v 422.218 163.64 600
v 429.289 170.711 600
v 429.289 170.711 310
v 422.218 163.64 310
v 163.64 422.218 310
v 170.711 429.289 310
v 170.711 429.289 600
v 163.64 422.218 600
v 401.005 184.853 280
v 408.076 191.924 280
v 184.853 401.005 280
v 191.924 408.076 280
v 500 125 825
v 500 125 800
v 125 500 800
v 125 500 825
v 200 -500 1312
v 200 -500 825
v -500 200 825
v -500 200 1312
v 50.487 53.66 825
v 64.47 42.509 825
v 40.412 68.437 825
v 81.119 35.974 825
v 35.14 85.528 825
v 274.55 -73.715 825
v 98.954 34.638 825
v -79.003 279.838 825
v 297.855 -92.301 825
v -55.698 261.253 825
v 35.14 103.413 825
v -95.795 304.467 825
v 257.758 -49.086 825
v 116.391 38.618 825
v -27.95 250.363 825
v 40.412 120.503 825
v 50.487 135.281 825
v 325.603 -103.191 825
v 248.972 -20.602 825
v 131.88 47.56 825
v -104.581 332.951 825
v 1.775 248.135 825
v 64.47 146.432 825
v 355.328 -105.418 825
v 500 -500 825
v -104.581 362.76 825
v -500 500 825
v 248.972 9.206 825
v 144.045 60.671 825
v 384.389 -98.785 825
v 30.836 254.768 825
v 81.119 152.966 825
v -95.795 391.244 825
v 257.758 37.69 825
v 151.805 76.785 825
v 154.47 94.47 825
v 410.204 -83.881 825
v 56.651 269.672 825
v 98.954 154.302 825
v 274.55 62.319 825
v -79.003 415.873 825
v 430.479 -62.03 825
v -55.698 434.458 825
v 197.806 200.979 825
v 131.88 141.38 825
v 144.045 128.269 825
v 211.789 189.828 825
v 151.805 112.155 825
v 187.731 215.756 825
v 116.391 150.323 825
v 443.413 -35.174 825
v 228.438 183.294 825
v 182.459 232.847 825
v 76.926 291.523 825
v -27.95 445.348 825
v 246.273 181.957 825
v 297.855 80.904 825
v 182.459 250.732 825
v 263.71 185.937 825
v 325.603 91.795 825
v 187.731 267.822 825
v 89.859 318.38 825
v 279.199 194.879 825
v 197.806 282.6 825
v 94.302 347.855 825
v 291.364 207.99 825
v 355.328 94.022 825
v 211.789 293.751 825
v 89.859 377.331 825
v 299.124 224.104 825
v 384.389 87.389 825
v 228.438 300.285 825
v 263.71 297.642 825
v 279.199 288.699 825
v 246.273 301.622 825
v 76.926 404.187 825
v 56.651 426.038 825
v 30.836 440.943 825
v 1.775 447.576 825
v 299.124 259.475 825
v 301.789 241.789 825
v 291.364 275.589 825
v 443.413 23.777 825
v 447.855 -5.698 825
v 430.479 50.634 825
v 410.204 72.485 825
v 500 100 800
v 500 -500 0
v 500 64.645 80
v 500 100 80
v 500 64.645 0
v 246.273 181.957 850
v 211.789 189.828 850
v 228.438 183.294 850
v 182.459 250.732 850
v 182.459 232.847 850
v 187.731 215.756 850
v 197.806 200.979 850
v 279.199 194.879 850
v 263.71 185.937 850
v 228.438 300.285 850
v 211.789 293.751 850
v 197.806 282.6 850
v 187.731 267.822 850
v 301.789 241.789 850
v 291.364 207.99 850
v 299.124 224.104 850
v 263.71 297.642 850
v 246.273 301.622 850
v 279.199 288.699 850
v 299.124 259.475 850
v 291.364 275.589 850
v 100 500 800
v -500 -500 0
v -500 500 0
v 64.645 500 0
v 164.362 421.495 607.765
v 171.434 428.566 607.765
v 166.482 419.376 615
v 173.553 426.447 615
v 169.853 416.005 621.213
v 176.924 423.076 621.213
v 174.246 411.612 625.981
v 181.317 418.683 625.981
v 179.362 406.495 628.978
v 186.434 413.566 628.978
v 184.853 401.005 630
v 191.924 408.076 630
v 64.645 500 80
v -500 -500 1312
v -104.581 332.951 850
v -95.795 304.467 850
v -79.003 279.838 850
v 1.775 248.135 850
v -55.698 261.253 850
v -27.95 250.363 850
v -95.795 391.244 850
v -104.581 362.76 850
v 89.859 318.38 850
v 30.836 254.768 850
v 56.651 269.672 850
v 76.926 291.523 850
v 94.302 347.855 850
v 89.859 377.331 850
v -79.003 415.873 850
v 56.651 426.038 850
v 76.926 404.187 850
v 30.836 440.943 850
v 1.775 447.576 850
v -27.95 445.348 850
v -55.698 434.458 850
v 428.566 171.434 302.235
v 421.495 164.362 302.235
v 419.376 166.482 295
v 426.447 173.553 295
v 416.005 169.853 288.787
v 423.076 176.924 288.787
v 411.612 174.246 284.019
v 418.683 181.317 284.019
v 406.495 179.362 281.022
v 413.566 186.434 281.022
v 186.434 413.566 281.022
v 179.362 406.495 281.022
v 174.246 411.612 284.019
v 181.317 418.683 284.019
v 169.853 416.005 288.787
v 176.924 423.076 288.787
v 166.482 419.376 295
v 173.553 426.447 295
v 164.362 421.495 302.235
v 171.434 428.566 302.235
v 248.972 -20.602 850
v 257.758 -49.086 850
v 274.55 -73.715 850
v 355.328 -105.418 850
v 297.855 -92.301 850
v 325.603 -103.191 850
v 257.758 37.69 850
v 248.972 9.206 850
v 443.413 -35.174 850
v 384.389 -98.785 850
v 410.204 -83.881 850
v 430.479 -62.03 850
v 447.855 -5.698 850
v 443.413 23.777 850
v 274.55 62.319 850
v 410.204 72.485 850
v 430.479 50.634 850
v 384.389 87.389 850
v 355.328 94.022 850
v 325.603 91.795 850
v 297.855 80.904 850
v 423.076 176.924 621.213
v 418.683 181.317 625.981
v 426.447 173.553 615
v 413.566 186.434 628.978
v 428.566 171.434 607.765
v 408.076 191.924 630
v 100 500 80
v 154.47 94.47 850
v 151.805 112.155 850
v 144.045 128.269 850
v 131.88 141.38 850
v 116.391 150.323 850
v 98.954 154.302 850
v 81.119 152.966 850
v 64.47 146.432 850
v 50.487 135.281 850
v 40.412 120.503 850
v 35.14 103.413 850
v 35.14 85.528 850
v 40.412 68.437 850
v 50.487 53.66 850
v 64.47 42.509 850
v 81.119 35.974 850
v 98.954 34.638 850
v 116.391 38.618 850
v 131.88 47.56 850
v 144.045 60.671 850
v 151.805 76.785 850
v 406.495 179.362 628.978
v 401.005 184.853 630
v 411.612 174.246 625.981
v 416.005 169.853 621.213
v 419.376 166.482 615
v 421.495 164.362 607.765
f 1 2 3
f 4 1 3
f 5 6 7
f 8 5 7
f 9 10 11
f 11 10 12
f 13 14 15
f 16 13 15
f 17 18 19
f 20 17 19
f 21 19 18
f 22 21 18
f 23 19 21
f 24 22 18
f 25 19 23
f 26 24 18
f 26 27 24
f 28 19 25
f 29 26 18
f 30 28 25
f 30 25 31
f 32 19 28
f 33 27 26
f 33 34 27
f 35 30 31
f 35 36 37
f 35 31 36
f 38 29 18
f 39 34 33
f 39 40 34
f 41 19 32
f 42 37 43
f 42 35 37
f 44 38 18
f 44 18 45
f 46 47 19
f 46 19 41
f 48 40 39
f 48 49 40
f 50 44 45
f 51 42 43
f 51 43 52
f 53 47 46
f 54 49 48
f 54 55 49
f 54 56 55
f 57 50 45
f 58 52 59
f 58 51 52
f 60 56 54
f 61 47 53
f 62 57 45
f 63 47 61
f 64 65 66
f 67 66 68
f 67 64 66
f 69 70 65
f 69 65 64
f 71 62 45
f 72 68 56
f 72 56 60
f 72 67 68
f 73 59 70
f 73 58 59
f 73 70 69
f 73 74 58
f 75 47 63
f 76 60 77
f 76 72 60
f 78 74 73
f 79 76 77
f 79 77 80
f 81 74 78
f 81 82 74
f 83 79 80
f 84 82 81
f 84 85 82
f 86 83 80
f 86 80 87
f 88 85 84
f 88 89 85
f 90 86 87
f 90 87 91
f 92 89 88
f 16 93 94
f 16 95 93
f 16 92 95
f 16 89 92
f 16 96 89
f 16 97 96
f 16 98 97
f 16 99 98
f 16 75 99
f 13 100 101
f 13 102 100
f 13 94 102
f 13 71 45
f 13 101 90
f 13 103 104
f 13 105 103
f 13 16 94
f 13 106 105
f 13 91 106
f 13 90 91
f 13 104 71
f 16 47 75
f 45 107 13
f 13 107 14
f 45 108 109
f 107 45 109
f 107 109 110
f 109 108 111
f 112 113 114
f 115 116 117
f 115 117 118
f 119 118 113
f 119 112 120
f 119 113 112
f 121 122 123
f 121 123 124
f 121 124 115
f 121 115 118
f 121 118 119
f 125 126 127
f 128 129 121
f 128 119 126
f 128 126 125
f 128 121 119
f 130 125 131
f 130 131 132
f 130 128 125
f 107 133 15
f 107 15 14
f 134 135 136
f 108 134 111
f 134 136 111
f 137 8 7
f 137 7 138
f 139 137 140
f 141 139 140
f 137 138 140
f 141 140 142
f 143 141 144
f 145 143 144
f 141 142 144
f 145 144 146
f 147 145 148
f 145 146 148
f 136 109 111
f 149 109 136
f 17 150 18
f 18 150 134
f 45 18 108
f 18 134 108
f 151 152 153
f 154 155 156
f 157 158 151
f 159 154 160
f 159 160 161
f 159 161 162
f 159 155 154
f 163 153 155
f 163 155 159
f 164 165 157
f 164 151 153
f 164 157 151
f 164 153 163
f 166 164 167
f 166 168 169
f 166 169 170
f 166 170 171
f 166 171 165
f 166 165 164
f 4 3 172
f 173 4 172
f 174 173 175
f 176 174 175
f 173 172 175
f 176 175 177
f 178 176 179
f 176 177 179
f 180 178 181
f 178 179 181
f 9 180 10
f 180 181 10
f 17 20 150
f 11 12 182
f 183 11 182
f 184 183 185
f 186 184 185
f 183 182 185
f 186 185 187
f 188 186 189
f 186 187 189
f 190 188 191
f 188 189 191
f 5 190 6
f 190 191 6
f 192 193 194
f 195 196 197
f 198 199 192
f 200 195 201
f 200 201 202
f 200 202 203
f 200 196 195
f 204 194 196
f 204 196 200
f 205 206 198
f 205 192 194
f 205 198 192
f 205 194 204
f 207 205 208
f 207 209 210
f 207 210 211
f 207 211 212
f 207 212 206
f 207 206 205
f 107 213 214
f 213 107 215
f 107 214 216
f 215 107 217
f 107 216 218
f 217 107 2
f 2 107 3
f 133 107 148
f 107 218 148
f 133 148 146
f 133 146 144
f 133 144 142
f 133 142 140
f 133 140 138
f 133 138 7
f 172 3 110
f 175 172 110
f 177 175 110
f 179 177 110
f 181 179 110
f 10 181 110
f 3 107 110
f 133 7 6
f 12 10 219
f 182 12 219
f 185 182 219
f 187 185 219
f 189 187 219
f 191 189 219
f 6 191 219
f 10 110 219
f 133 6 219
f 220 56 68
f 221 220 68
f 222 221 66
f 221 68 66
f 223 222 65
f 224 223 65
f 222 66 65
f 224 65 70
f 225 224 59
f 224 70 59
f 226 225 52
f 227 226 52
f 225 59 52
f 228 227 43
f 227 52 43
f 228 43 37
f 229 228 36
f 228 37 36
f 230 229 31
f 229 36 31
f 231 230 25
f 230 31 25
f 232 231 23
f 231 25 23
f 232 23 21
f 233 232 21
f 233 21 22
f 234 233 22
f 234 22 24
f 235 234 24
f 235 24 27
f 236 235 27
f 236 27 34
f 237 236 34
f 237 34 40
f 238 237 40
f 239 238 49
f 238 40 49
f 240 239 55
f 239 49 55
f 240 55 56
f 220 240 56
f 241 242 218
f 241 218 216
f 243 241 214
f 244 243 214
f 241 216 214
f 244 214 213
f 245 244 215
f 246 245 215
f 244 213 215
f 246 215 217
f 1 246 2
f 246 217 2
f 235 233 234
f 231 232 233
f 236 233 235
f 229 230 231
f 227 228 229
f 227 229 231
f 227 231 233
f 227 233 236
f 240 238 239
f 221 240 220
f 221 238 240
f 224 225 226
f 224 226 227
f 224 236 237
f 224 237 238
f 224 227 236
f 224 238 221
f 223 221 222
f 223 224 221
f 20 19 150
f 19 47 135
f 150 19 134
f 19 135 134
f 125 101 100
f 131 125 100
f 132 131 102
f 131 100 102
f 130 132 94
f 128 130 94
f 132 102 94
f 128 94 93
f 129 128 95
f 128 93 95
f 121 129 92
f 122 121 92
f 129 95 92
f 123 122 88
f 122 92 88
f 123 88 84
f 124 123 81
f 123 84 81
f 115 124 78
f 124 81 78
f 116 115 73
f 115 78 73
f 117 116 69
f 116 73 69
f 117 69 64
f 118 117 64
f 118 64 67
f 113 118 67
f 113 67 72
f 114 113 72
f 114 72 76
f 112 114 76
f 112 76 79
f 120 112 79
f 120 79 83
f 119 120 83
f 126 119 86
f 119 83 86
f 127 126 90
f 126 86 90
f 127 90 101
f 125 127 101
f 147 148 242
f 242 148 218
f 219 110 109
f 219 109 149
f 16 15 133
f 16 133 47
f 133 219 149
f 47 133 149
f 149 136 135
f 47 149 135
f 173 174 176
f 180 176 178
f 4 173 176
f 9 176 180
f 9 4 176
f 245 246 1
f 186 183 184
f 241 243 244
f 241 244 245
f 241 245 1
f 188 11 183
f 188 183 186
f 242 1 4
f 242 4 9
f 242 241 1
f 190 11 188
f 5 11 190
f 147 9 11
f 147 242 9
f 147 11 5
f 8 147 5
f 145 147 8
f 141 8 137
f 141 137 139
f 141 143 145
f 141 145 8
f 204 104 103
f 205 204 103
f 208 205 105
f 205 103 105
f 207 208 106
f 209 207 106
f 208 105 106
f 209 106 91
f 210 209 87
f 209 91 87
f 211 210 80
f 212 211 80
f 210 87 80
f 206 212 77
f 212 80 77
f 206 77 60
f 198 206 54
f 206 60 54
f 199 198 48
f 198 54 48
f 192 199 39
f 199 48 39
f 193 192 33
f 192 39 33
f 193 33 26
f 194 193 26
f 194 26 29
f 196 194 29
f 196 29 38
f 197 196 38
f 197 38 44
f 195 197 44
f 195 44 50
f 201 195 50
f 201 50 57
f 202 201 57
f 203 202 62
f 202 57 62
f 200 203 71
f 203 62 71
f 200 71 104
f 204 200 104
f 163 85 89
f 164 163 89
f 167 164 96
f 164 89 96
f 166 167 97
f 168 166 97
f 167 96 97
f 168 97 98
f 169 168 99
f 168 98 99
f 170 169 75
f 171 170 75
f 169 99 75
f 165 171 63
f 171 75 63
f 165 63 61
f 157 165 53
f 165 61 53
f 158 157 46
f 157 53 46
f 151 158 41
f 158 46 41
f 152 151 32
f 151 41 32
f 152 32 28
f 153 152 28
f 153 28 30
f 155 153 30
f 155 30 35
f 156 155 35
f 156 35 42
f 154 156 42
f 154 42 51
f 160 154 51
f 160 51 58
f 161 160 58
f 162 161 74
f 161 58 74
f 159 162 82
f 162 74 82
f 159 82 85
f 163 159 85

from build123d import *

# Parameters (mm, degrees)
F1_DEPTH  = 800
F3_DEPTH  = 25
F4_W      = 1255.690882
F4_H      = 80
F5_DEPTH  = 25
F6_R      = 60
F6_R_2    = 100
F7_DEPTH  = 25
F9_DEPTH  = 10
F11_DEPTH = 487


with BuildPart() as f1:
    # F0 (on Top) → F1 (new body)
    with BuildSketch(Plane.XY):
        Polygon((-500, 500), (-500, -500), (500, -500), (500, 100), (100, 500), align=None)
    extrude(amount=F1_DEPTH)

    # F2 (on face) → F3 (join)
    with BuildSketch(Plane.XY.offset(800)):
        Polygon((-500, 500), (-500, -500), (500, -500), (500, 125), (125, 500), align=None)
    extrude(amount=F3_DEPTH)

    # F4 (on face) → F5 (cut)
    with BuildSketch(Plane(origin=(300, 300, 0), x_dir=(-0.707107, 0.707107, 0), z_dir=(0.707107, 0.707107, 0))):
        with Locations((133.201046, 40)):
            Rectangle(F4_W, F4_H)
    extrude(amount=-F5_DEPTH, mode=Mode.SUBTRACT)

    # F6 (on face) → F7 (join)
    with BuildSketch(Plane.XY.offset(825)):
        with Locations((241.789322, 241.789322)):
            Circle(F6_R)
        with Locations((94.470174, 94.470174)):
            Circle(F6_R)
        with Locations((347.855339, -5.698052)):
            Circle(F6_R_2)
        with Locations((-5.698052, 347.855339)):
            Circle(F6_R_2)
    extrude(amount=F7_DEPTH)

    # F8 (on face) → F9 (cut)
    with BuildSketch(Plane(origin=(300, 300, 0), x_dir=(-0.707107, 0.707107, 0), z_dir=(0.707107, 0.707107, 0))):
        with BuildLine():
            ThreePointArc((-182.842712, 310), (-174.055916, 288.786797), (-152.842712, 280))
            Line((-152.842712, 280), (152.842712, 280))
            ThreePointArc((152.842712, 280), (174.055916, 288.786797), (182.842712, 310))
            Line((182.842712, 310), (182.842712, 600))
            ThreePointArc((182.842712, 600), (174.055916, 621.213203), (152.842712, 630))
            Line((152.842712, 630), (-152.842712, 630))
            ThreePointArc((-152.842712, 630), (-174.055916, 621.213203), (-182.842712, 600))
            Line((-182.842712, 600), (-182.842712, 310))
        make_face()
    extrude(amount=-F9_DEPTH, mode=Mode.SUBTRACT)

    # F10 (on face) → F11 (join)
    with BuildSketch(Plane.XY.offset(825)):
        Polygon((-500, 200), (-500, -500), (200, -500), align=None)
    extrude(amount=F11_DEPTH)


solid = f1.part
